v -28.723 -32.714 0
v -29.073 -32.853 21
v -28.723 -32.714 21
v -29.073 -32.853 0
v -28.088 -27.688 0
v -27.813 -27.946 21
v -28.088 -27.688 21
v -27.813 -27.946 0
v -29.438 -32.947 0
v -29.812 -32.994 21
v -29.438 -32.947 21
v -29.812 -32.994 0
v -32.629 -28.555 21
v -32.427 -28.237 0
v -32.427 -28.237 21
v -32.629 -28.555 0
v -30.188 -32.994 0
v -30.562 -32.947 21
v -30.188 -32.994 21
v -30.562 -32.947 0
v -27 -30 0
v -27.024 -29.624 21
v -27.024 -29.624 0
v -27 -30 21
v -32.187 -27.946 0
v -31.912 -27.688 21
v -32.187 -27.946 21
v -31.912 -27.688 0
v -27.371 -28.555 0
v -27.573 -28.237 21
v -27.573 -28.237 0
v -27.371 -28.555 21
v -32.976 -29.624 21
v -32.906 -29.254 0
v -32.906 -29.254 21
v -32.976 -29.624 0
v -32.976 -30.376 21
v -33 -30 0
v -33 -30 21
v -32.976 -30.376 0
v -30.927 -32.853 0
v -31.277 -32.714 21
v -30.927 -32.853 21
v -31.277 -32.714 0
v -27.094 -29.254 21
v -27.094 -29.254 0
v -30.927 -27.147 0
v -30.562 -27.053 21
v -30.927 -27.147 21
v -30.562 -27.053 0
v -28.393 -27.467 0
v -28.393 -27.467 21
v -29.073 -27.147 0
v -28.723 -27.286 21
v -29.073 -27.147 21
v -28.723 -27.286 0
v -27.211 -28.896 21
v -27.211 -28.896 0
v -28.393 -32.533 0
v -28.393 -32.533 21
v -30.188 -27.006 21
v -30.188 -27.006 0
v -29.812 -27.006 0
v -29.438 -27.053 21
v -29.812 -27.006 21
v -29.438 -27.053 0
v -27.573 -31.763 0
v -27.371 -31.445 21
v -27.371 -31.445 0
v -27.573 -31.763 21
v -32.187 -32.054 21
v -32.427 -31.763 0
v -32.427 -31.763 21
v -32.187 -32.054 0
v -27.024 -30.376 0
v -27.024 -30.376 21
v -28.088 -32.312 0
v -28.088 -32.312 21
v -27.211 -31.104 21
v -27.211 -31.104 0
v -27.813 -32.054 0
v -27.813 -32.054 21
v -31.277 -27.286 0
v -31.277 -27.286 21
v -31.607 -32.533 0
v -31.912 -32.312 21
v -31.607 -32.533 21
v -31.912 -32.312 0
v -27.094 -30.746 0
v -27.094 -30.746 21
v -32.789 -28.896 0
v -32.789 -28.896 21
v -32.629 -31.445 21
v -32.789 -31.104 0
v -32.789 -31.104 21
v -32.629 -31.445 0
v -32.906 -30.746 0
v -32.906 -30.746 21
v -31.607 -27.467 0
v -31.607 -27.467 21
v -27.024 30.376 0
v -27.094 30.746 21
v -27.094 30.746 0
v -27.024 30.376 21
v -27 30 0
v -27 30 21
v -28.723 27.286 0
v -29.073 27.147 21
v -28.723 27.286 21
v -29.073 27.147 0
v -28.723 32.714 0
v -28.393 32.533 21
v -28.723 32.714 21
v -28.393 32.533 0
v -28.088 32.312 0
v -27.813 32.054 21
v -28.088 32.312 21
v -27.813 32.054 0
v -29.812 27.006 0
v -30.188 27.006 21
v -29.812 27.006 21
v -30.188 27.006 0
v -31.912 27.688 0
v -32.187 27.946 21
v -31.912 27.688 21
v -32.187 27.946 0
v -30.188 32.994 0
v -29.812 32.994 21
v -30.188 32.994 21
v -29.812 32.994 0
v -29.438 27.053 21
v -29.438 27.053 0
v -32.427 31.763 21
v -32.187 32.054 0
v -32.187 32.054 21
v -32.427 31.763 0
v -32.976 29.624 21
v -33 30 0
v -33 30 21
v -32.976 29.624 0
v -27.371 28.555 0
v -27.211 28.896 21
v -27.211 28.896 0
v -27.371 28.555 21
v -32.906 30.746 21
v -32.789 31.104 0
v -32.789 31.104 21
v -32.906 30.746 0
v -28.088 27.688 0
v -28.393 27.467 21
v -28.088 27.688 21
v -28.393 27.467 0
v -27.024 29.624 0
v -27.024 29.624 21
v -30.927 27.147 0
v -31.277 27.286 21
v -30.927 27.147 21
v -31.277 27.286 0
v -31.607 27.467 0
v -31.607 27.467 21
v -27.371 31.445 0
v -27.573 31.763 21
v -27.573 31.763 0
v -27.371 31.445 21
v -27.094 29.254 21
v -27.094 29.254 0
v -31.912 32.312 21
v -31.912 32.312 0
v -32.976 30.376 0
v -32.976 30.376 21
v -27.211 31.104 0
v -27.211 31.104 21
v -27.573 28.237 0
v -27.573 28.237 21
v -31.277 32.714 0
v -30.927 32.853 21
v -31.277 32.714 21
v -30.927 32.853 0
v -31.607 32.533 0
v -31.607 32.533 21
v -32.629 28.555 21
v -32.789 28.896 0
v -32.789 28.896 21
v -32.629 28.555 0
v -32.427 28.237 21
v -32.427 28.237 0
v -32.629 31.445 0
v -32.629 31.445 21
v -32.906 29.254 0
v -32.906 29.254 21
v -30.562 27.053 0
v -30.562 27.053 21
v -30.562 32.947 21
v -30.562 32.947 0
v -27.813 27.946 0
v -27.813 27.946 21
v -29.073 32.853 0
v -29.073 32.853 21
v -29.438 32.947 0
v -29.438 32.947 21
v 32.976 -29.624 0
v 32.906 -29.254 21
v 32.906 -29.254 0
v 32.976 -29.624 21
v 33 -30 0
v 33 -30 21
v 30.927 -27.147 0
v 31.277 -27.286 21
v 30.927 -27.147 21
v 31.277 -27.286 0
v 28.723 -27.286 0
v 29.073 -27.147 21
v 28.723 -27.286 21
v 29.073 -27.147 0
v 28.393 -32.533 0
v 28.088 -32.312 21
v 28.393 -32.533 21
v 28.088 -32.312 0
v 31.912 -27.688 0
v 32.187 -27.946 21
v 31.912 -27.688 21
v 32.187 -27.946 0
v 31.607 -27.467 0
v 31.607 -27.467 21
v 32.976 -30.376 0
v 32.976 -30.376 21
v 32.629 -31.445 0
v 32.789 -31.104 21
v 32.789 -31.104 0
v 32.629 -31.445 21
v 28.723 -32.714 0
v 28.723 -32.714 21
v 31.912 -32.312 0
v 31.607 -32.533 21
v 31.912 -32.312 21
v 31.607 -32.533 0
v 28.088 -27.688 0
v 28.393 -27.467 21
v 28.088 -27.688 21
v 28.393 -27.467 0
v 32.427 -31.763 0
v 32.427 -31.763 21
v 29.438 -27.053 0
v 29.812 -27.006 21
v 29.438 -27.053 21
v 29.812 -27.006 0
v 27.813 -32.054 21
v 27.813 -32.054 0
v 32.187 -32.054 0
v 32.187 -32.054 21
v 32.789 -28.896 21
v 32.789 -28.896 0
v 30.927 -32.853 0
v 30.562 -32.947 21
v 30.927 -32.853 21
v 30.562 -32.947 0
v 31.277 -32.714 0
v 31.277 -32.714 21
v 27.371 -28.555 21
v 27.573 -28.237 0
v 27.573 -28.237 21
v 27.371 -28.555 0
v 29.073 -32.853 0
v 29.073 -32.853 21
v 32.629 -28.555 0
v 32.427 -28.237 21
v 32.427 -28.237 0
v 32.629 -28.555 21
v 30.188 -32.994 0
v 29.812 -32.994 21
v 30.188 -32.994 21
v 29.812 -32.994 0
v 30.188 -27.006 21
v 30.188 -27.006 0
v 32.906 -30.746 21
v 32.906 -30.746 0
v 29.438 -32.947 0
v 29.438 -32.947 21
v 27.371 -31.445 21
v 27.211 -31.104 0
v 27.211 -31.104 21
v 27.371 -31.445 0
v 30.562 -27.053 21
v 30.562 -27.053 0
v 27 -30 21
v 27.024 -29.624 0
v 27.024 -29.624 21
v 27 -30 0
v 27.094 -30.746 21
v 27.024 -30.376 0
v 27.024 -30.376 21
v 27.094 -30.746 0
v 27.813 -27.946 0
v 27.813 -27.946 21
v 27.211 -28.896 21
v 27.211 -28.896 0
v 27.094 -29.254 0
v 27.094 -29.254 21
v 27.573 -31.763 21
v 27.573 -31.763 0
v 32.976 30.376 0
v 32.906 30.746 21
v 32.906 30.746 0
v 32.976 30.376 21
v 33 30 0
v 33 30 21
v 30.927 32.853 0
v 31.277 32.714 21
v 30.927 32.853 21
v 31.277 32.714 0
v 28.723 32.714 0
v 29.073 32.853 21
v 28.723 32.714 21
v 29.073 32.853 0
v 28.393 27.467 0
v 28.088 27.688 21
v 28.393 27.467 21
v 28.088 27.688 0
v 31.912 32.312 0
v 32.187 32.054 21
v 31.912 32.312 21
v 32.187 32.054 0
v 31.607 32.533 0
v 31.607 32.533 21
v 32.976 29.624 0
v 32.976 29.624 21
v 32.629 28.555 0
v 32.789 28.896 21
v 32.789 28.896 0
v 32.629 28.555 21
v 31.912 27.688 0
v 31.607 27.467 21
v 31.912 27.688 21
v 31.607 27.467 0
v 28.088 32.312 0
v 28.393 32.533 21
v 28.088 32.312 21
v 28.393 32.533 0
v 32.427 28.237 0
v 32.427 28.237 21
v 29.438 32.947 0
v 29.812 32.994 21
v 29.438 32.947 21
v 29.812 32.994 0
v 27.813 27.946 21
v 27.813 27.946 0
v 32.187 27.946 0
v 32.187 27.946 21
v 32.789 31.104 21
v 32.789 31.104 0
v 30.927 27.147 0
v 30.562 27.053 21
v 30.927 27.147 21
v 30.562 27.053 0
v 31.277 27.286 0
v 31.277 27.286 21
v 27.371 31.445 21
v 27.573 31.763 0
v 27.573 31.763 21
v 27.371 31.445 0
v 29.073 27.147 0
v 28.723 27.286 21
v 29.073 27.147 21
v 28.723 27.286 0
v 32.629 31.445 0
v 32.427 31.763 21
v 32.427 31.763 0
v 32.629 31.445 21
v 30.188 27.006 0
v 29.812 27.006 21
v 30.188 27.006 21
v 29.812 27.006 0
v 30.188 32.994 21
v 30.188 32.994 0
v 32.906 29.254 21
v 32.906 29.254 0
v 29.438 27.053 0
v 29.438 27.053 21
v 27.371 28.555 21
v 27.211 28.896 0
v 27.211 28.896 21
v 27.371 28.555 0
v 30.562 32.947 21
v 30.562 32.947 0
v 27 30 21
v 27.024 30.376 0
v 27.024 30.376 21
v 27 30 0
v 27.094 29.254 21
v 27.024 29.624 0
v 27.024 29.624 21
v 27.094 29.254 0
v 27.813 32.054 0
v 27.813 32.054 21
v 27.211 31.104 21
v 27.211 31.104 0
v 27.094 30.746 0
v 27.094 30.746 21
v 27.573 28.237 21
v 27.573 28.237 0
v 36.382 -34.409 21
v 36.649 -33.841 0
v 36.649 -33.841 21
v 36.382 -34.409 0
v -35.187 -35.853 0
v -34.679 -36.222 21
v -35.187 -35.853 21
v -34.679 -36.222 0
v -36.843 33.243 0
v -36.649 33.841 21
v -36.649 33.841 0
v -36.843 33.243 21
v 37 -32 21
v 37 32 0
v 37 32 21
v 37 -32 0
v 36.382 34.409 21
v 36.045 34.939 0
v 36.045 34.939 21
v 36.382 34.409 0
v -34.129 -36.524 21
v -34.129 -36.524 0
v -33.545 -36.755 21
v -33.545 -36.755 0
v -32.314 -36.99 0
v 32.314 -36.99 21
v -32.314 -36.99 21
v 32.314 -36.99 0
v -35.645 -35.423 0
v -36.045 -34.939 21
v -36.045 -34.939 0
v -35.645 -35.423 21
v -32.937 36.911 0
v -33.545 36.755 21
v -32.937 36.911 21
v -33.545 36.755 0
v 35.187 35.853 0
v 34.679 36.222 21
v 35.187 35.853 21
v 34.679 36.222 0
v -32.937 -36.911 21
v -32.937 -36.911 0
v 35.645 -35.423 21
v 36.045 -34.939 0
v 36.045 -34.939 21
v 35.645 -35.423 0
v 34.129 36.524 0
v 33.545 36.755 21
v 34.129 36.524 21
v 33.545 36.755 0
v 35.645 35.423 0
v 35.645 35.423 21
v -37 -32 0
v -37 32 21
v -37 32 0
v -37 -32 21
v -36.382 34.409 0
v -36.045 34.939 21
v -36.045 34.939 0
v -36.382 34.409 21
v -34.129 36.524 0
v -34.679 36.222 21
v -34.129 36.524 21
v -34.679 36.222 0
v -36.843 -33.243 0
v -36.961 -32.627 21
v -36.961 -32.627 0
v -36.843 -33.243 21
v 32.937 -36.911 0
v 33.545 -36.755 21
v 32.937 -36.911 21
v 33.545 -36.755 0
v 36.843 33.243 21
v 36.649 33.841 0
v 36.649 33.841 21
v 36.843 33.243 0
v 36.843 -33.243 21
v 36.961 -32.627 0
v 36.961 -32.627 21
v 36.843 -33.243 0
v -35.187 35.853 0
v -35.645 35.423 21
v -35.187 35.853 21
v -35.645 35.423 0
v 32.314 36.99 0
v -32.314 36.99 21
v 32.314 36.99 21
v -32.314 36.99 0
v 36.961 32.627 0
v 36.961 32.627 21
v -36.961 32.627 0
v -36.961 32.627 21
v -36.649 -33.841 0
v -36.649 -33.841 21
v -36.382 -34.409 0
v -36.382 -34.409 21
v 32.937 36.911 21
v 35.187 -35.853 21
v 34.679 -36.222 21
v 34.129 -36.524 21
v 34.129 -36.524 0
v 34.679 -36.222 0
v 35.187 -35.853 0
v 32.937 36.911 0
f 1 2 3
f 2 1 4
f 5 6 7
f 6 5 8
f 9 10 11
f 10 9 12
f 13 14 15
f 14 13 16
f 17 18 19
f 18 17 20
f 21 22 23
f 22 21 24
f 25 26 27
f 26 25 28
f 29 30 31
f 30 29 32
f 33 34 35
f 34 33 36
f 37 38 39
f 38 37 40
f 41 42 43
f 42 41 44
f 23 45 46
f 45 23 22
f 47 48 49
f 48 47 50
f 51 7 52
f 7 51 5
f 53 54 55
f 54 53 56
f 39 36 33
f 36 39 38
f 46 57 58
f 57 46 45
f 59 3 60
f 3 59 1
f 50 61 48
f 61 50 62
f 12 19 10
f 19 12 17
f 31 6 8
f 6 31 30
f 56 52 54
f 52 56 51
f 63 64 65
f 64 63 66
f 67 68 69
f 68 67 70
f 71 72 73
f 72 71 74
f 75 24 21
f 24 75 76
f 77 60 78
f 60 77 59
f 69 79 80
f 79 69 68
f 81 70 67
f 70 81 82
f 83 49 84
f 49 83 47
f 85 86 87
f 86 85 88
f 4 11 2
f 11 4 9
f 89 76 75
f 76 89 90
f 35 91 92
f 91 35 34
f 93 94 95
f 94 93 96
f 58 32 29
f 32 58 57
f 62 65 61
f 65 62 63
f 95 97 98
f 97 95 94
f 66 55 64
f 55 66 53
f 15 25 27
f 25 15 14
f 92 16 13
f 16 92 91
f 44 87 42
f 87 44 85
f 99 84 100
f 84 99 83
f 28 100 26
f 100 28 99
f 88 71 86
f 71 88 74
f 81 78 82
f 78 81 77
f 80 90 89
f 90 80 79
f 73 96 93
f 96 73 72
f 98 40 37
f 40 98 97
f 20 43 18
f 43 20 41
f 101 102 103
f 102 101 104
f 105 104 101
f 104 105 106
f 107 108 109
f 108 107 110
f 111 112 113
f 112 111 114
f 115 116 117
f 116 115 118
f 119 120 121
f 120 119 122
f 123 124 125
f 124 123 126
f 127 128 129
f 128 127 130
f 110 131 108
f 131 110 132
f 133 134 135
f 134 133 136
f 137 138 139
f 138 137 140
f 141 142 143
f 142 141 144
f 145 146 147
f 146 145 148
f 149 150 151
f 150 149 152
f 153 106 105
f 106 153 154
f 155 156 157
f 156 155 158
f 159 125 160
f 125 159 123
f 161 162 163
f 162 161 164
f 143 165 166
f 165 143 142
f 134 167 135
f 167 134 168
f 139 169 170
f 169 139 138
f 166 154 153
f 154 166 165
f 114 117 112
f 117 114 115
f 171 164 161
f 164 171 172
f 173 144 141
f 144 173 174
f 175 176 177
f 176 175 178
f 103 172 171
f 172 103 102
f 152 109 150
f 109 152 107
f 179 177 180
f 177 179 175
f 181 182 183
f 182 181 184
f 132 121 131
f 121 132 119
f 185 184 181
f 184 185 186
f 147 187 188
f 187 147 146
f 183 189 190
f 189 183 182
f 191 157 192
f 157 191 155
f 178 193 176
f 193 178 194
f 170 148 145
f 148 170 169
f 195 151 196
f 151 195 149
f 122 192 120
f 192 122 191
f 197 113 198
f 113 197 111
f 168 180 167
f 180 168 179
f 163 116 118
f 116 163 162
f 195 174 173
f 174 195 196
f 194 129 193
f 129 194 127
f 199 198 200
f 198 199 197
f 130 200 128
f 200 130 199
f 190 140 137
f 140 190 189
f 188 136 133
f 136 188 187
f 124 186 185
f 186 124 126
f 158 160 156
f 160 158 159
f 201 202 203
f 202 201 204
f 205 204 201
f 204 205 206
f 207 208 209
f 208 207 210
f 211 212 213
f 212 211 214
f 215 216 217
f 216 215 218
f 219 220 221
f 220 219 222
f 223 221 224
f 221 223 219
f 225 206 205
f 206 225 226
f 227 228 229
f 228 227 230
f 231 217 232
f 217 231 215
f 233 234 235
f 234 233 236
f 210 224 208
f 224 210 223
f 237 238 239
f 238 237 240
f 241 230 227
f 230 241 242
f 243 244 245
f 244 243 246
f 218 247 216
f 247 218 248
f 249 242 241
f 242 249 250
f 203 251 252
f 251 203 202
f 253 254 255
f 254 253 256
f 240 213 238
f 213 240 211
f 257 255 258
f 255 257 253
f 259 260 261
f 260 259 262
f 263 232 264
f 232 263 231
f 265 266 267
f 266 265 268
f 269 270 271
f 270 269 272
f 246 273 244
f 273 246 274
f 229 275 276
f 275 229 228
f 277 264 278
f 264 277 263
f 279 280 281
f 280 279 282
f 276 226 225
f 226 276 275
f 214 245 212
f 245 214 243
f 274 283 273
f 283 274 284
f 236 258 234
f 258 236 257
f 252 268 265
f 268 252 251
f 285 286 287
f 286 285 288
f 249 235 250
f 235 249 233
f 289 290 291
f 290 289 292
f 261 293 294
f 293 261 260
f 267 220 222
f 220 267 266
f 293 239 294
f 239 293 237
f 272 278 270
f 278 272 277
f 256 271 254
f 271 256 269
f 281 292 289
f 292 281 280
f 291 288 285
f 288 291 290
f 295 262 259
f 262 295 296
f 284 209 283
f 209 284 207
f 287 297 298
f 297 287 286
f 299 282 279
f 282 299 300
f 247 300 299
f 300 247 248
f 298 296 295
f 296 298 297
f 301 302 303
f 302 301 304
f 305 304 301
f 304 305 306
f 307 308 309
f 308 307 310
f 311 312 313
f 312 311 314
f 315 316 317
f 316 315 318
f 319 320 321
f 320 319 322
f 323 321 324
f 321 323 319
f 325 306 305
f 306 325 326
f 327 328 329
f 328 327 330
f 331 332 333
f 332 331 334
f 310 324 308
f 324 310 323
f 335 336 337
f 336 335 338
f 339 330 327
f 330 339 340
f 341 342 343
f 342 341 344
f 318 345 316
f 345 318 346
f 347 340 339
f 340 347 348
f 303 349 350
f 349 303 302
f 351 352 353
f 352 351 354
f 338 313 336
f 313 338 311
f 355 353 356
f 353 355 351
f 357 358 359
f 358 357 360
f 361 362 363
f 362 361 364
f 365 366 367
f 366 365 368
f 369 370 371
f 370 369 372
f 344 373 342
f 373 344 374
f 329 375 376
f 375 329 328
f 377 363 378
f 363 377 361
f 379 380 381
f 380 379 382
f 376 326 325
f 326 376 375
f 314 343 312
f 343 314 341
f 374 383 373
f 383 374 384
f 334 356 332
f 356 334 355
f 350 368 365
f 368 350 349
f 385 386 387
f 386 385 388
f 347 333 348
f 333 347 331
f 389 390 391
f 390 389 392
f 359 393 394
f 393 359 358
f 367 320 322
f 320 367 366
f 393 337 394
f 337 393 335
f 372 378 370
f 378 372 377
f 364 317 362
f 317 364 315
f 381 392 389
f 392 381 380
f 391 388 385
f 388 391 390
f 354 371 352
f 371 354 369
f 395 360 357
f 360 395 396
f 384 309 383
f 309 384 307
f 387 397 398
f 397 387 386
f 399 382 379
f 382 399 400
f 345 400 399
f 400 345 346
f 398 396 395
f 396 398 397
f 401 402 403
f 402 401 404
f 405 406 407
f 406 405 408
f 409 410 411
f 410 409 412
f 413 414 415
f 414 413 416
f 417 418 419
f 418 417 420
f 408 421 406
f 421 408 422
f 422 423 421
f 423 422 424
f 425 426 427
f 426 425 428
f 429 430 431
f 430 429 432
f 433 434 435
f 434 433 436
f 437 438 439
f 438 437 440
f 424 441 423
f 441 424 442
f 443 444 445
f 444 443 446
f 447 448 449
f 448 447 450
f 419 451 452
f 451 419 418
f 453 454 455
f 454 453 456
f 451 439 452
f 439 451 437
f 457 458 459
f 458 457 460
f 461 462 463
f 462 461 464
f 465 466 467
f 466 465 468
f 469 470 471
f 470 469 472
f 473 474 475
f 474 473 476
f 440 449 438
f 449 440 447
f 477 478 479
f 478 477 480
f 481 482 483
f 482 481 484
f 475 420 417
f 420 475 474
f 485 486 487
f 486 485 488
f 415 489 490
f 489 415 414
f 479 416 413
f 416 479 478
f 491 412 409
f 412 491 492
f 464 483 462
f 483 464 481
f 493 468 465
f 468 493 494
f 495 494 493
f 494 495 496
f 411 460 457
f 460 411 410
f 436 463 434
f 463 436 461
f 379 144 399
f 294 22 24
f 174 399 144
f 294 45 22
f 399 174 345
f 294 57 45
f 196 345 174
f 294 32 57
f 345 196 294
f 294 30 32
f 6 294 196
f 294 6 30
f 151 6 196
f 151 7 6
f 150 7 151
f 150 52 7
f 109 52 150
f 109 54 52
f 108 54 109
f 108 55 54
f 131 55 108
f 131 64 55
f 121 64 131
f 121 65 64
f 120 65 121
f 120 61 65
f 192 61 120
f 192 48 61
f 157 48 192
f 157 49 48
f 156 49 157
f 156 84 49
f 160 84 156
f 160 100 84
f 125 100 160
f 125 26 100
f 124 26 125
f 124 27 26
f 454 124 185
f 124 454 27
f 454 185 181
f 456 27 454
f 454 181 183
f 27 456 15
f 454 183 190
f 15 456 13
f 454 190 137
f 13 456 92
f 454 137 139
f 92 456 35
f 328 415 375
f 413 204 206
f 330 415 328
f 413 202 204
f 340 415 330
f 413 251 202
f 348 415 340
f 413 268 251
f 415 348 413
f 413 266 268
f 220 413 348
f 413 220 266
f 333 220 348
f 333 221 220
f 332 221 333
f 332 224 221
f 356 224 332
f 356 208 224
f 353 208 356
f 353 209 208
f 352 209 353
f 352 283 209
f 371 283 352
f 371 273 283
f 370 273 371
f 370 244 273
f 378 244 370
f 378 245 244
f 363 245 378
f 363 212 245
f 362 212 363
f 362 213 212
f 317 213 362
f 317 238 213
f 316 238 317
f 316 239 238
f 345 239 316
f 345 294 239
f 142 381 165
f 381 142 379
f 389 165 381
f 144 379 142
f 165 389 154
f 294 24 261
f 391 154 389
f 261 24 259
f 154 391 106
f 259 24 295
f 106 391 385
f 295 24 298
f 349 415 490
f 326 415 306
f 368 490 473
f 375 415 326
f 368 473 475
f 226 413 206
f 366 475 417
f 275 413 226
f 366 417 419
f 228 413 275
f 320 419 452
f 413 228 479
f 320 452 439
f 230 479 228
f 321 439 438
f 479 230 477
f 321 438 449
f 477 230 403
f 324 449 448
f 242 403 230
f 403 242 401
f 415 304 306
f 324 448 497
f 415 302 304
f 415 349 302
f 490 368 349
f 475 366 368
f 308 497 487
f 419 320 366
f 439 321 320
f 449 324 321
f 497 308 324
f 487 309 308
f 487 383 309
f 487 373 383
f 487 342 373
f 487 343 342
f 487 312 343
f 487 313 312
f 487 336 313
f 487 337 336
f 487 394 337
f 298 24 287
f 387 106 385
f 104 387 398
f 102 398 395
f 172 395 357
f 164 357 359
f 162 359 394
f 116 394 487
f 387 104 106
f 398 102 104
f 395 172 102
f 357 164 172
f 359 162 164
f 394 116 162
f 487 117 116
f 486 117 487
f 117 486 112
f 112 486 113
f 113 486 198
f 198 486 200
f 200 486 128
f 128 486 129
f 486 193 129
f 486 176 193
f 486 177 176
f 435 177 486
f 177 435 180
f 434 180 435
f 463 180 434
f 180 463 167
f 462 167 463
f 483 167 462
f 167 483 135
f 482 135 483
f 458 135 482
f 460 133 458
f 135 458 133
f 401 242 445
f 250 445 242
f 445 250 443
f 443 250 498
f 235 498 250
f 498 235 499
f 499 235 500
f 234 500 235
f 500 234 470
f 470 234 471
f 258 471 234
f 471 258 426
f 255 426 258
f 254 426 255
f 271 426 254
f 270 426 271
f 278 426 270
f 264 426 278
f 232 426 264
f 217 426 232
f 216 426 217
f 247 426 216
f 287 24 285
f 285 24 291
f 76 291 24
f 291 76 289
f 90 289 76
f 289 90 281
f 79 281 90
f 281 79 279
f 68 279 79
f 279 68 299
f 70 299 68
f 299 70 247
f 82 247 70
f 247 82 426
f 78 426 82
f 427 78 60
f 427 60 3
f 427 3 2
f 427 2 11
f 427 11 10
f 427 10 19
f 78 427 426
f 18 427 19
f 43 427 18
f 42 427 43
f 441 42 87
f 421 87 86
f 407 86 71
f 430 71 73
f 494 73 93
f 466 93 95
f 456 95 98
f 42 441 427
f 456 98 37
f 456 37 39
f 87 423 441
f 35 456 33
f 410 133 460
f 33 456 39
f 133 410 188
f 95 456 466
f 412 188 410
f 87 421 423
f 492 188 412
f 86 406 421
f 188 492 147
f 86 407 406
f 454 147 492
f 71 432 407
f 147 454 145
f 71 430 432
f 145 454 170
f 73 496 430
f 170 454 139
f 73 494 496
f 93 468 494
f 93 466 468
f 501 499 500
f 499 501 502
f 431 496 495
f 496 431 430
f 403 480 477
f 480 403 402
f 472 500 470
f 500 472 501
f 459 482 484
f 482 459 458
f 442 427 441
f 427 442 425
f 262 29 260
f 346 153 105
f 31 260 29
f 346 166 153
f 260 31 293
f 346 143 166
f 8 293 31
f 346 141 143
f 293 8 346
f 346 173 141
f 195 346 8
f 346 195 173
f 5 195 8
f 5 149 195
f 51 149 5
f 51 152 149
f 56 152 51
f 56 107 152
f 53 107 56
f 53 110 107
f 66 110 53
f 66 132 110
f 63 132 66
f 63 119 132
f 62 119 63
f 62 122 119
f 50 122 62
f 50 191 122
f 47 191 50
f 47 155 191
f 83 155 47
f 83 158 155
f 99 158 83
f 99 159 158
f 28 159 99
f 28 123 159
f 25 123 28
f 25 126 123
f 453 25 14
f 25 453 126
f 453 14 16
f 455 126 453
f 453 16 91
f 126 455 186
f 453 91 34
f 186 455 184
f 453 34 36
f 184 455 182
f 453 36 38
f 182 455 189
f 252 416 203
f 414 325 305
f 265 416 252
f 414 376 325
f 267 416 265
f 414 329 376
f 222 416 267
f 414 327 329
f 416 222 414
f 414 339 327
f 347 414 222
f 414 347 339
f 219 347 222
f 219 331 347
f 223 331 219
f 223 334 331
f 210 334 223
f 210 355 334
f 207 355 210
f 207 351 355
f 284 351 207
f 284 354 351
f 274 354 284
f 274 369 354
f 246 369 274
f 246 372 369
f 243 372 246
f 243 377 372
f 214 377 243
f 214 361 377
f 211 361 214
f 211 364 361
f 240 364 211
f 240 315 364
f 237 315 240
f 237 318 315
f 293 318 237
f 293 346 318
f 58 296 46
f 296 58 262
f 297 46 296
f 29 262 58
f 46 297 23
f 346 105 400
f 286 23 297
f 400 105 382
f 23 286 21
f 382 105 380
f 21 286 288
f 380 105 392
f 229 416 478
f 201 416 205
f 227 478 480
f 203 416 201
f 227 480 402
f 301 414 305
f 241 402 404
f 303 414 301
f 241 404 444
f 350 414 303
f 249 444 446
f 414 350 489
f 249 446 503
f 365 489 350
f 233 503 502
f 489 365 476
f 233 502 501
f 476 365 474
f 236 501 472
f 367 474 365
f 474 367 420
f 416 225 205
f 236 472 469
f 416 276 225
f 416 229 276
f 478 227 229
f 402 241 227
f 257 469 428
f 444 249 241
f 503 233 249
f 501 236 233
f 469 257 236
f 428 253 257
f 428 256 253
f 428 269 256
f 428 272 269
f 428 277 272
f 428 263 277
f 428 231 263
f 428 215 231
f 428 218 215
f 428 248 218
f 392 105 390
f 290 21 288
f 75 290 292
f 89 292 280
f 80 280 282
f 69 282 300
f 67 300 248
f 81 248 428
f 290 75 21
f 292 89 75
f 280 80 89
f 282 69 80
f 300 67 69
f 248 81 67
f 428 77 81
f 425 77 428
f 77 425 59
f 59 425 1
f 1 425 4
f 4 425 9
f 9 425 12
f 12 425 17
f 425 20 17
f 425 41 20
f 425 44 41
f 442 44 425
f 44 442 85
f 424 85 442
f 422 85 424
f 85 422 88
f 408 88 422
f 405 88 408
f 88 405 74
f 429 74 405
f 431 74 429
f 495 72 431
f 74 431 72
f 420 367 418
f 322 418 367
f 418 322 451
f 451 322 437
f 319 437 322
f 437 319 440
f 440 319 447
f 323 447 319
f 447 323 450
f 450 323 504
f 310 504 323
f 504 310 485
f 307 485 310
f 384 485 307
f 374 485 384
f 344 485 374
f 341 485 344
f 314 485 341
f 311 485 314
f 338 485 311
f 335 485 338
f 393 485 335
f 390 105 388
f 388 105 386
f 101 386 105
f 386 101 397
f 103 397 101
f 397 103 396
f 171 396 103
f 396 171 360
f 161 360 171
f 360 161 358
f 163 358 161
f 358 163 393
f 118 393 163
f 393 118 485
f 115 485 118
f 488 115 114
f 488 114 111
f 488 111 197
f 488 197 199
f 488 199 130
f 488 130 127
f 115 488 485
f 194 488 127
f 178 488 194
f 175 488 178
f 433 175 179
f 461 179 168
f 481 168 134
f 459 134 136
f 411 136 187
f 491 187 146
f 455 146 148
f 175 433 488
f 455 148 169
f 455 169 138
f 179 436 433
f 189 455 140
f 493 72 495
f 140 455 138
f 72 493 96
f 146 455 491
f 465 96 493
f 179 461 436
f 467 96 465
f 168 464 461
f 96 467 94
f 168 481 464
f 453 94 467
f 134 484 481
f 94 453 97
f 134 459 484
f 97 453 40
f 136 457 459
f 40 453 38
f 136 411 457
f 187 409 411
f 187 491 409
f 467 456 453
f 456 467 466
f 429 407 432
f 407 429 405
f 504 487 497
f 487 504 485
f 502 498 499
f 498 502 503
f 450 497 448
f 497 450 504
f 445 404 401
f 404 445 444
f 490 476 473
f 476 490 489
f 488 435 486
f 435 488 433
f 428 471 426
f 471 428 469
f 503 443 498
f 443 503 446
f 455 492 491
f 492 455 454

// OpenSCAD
$fn = 50;


difference() {
	union() {
		hull() {
			translate(v = [-32.0000000000, 32.0000000000, 0]) {
				cylinder(h = 21, r = 5);
			}
			translate(v = [32.0000000000, 32.0000000000, 0]) {
				cylinder(h = 21, r = 5);
			}
			translate(v = [-32.0000000000, -32.0000000000, 0]) {
				cylinder(h = 21, r = 5);
			}
			translate(v = [32.0000000000, -32.0000000000, 0]) {
				cylinder(h = 21, r = 5);
			}
		}
	}
	union() {
		translate(v = [-30.0000000000, -30.0000000000, -100.0000000000]) {
			cylinder(h = 200, r = 3.0000000000);
		}
		translate(v = [-30.0000000000, 30.0000000000, -100.0000000000]) {
			cylinder(h = 200, r = 3.0000000000);
		}
		translate(v = [30.0000000000, -30.0000000000, -100.0000000000]) {
			cylinder(h = 200, r = 3.0000000000);
		}
		translate(v = [30.0000000000, 30.0000000000, -100.0000000000]) {
			cylinder(h = 200, r = 3.0000000000);
		}
	}
}
